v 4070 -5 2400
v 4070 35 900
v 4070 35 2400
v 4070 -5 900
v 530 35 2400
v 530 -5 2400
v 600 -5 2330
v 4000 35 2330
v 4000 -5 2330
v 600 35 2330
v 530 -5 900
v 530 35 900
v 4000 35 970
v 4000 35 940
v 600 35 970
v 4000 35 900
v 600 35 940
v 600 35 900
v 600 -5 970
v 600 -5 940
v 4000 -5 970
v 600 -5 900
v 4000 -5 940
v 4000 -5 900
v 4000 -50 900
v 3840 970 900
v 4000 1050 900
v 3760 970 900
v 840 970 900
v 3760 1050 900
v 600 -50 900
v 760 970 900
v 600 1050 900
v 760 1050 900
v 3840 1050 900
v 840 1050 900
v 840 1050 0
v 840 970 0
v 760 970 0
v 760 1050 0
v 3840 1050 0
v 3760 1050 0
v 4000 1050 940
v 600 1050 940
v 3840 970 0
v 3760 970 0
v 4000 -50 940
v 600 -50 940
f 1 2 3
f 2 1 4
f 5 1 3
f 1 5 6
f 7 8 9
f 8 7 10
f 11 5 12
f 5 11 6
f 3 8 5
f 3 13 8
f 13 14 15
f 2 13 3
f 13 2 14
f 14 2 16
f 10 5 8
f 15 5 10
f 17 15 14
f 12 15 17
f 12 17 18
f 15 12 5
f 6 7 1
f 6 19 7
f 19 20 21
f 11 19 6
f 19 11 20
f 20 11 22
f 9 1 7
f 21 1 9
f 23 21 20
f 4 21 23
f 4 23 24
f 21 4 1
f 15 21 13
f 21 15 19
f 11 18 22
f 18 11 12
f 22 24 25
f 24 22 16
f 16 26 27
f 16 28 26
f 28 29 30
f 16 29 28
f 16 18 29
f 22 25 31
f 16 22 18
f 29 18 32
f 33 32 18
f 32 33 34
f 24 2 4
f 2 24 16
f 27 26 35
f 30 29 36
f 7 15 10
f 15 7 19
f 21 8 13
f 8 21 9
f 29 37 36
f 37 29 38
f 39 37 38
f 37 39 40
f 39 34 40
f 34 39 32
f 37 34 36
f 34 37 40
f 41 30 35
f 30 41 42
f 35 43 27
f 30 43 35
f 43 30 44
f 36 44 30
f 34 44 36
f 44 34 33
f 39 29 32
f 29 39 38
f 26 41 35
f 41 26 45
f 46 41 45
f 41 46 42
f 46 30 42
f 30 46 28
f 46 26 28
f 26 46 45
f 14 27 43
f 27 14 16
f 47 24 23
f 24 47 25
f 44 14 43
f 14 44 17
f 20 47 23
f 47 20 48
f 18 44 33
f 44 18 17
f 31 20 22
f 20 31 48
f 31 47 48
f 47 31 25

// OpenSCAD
// part_window_frame.scad — Export all 4 frame bars as one combined OBJ.
// Press F6 (render), then File -> Export as OBJ.
include <tea_shop_counter_modules.scad>;
window_frame();
